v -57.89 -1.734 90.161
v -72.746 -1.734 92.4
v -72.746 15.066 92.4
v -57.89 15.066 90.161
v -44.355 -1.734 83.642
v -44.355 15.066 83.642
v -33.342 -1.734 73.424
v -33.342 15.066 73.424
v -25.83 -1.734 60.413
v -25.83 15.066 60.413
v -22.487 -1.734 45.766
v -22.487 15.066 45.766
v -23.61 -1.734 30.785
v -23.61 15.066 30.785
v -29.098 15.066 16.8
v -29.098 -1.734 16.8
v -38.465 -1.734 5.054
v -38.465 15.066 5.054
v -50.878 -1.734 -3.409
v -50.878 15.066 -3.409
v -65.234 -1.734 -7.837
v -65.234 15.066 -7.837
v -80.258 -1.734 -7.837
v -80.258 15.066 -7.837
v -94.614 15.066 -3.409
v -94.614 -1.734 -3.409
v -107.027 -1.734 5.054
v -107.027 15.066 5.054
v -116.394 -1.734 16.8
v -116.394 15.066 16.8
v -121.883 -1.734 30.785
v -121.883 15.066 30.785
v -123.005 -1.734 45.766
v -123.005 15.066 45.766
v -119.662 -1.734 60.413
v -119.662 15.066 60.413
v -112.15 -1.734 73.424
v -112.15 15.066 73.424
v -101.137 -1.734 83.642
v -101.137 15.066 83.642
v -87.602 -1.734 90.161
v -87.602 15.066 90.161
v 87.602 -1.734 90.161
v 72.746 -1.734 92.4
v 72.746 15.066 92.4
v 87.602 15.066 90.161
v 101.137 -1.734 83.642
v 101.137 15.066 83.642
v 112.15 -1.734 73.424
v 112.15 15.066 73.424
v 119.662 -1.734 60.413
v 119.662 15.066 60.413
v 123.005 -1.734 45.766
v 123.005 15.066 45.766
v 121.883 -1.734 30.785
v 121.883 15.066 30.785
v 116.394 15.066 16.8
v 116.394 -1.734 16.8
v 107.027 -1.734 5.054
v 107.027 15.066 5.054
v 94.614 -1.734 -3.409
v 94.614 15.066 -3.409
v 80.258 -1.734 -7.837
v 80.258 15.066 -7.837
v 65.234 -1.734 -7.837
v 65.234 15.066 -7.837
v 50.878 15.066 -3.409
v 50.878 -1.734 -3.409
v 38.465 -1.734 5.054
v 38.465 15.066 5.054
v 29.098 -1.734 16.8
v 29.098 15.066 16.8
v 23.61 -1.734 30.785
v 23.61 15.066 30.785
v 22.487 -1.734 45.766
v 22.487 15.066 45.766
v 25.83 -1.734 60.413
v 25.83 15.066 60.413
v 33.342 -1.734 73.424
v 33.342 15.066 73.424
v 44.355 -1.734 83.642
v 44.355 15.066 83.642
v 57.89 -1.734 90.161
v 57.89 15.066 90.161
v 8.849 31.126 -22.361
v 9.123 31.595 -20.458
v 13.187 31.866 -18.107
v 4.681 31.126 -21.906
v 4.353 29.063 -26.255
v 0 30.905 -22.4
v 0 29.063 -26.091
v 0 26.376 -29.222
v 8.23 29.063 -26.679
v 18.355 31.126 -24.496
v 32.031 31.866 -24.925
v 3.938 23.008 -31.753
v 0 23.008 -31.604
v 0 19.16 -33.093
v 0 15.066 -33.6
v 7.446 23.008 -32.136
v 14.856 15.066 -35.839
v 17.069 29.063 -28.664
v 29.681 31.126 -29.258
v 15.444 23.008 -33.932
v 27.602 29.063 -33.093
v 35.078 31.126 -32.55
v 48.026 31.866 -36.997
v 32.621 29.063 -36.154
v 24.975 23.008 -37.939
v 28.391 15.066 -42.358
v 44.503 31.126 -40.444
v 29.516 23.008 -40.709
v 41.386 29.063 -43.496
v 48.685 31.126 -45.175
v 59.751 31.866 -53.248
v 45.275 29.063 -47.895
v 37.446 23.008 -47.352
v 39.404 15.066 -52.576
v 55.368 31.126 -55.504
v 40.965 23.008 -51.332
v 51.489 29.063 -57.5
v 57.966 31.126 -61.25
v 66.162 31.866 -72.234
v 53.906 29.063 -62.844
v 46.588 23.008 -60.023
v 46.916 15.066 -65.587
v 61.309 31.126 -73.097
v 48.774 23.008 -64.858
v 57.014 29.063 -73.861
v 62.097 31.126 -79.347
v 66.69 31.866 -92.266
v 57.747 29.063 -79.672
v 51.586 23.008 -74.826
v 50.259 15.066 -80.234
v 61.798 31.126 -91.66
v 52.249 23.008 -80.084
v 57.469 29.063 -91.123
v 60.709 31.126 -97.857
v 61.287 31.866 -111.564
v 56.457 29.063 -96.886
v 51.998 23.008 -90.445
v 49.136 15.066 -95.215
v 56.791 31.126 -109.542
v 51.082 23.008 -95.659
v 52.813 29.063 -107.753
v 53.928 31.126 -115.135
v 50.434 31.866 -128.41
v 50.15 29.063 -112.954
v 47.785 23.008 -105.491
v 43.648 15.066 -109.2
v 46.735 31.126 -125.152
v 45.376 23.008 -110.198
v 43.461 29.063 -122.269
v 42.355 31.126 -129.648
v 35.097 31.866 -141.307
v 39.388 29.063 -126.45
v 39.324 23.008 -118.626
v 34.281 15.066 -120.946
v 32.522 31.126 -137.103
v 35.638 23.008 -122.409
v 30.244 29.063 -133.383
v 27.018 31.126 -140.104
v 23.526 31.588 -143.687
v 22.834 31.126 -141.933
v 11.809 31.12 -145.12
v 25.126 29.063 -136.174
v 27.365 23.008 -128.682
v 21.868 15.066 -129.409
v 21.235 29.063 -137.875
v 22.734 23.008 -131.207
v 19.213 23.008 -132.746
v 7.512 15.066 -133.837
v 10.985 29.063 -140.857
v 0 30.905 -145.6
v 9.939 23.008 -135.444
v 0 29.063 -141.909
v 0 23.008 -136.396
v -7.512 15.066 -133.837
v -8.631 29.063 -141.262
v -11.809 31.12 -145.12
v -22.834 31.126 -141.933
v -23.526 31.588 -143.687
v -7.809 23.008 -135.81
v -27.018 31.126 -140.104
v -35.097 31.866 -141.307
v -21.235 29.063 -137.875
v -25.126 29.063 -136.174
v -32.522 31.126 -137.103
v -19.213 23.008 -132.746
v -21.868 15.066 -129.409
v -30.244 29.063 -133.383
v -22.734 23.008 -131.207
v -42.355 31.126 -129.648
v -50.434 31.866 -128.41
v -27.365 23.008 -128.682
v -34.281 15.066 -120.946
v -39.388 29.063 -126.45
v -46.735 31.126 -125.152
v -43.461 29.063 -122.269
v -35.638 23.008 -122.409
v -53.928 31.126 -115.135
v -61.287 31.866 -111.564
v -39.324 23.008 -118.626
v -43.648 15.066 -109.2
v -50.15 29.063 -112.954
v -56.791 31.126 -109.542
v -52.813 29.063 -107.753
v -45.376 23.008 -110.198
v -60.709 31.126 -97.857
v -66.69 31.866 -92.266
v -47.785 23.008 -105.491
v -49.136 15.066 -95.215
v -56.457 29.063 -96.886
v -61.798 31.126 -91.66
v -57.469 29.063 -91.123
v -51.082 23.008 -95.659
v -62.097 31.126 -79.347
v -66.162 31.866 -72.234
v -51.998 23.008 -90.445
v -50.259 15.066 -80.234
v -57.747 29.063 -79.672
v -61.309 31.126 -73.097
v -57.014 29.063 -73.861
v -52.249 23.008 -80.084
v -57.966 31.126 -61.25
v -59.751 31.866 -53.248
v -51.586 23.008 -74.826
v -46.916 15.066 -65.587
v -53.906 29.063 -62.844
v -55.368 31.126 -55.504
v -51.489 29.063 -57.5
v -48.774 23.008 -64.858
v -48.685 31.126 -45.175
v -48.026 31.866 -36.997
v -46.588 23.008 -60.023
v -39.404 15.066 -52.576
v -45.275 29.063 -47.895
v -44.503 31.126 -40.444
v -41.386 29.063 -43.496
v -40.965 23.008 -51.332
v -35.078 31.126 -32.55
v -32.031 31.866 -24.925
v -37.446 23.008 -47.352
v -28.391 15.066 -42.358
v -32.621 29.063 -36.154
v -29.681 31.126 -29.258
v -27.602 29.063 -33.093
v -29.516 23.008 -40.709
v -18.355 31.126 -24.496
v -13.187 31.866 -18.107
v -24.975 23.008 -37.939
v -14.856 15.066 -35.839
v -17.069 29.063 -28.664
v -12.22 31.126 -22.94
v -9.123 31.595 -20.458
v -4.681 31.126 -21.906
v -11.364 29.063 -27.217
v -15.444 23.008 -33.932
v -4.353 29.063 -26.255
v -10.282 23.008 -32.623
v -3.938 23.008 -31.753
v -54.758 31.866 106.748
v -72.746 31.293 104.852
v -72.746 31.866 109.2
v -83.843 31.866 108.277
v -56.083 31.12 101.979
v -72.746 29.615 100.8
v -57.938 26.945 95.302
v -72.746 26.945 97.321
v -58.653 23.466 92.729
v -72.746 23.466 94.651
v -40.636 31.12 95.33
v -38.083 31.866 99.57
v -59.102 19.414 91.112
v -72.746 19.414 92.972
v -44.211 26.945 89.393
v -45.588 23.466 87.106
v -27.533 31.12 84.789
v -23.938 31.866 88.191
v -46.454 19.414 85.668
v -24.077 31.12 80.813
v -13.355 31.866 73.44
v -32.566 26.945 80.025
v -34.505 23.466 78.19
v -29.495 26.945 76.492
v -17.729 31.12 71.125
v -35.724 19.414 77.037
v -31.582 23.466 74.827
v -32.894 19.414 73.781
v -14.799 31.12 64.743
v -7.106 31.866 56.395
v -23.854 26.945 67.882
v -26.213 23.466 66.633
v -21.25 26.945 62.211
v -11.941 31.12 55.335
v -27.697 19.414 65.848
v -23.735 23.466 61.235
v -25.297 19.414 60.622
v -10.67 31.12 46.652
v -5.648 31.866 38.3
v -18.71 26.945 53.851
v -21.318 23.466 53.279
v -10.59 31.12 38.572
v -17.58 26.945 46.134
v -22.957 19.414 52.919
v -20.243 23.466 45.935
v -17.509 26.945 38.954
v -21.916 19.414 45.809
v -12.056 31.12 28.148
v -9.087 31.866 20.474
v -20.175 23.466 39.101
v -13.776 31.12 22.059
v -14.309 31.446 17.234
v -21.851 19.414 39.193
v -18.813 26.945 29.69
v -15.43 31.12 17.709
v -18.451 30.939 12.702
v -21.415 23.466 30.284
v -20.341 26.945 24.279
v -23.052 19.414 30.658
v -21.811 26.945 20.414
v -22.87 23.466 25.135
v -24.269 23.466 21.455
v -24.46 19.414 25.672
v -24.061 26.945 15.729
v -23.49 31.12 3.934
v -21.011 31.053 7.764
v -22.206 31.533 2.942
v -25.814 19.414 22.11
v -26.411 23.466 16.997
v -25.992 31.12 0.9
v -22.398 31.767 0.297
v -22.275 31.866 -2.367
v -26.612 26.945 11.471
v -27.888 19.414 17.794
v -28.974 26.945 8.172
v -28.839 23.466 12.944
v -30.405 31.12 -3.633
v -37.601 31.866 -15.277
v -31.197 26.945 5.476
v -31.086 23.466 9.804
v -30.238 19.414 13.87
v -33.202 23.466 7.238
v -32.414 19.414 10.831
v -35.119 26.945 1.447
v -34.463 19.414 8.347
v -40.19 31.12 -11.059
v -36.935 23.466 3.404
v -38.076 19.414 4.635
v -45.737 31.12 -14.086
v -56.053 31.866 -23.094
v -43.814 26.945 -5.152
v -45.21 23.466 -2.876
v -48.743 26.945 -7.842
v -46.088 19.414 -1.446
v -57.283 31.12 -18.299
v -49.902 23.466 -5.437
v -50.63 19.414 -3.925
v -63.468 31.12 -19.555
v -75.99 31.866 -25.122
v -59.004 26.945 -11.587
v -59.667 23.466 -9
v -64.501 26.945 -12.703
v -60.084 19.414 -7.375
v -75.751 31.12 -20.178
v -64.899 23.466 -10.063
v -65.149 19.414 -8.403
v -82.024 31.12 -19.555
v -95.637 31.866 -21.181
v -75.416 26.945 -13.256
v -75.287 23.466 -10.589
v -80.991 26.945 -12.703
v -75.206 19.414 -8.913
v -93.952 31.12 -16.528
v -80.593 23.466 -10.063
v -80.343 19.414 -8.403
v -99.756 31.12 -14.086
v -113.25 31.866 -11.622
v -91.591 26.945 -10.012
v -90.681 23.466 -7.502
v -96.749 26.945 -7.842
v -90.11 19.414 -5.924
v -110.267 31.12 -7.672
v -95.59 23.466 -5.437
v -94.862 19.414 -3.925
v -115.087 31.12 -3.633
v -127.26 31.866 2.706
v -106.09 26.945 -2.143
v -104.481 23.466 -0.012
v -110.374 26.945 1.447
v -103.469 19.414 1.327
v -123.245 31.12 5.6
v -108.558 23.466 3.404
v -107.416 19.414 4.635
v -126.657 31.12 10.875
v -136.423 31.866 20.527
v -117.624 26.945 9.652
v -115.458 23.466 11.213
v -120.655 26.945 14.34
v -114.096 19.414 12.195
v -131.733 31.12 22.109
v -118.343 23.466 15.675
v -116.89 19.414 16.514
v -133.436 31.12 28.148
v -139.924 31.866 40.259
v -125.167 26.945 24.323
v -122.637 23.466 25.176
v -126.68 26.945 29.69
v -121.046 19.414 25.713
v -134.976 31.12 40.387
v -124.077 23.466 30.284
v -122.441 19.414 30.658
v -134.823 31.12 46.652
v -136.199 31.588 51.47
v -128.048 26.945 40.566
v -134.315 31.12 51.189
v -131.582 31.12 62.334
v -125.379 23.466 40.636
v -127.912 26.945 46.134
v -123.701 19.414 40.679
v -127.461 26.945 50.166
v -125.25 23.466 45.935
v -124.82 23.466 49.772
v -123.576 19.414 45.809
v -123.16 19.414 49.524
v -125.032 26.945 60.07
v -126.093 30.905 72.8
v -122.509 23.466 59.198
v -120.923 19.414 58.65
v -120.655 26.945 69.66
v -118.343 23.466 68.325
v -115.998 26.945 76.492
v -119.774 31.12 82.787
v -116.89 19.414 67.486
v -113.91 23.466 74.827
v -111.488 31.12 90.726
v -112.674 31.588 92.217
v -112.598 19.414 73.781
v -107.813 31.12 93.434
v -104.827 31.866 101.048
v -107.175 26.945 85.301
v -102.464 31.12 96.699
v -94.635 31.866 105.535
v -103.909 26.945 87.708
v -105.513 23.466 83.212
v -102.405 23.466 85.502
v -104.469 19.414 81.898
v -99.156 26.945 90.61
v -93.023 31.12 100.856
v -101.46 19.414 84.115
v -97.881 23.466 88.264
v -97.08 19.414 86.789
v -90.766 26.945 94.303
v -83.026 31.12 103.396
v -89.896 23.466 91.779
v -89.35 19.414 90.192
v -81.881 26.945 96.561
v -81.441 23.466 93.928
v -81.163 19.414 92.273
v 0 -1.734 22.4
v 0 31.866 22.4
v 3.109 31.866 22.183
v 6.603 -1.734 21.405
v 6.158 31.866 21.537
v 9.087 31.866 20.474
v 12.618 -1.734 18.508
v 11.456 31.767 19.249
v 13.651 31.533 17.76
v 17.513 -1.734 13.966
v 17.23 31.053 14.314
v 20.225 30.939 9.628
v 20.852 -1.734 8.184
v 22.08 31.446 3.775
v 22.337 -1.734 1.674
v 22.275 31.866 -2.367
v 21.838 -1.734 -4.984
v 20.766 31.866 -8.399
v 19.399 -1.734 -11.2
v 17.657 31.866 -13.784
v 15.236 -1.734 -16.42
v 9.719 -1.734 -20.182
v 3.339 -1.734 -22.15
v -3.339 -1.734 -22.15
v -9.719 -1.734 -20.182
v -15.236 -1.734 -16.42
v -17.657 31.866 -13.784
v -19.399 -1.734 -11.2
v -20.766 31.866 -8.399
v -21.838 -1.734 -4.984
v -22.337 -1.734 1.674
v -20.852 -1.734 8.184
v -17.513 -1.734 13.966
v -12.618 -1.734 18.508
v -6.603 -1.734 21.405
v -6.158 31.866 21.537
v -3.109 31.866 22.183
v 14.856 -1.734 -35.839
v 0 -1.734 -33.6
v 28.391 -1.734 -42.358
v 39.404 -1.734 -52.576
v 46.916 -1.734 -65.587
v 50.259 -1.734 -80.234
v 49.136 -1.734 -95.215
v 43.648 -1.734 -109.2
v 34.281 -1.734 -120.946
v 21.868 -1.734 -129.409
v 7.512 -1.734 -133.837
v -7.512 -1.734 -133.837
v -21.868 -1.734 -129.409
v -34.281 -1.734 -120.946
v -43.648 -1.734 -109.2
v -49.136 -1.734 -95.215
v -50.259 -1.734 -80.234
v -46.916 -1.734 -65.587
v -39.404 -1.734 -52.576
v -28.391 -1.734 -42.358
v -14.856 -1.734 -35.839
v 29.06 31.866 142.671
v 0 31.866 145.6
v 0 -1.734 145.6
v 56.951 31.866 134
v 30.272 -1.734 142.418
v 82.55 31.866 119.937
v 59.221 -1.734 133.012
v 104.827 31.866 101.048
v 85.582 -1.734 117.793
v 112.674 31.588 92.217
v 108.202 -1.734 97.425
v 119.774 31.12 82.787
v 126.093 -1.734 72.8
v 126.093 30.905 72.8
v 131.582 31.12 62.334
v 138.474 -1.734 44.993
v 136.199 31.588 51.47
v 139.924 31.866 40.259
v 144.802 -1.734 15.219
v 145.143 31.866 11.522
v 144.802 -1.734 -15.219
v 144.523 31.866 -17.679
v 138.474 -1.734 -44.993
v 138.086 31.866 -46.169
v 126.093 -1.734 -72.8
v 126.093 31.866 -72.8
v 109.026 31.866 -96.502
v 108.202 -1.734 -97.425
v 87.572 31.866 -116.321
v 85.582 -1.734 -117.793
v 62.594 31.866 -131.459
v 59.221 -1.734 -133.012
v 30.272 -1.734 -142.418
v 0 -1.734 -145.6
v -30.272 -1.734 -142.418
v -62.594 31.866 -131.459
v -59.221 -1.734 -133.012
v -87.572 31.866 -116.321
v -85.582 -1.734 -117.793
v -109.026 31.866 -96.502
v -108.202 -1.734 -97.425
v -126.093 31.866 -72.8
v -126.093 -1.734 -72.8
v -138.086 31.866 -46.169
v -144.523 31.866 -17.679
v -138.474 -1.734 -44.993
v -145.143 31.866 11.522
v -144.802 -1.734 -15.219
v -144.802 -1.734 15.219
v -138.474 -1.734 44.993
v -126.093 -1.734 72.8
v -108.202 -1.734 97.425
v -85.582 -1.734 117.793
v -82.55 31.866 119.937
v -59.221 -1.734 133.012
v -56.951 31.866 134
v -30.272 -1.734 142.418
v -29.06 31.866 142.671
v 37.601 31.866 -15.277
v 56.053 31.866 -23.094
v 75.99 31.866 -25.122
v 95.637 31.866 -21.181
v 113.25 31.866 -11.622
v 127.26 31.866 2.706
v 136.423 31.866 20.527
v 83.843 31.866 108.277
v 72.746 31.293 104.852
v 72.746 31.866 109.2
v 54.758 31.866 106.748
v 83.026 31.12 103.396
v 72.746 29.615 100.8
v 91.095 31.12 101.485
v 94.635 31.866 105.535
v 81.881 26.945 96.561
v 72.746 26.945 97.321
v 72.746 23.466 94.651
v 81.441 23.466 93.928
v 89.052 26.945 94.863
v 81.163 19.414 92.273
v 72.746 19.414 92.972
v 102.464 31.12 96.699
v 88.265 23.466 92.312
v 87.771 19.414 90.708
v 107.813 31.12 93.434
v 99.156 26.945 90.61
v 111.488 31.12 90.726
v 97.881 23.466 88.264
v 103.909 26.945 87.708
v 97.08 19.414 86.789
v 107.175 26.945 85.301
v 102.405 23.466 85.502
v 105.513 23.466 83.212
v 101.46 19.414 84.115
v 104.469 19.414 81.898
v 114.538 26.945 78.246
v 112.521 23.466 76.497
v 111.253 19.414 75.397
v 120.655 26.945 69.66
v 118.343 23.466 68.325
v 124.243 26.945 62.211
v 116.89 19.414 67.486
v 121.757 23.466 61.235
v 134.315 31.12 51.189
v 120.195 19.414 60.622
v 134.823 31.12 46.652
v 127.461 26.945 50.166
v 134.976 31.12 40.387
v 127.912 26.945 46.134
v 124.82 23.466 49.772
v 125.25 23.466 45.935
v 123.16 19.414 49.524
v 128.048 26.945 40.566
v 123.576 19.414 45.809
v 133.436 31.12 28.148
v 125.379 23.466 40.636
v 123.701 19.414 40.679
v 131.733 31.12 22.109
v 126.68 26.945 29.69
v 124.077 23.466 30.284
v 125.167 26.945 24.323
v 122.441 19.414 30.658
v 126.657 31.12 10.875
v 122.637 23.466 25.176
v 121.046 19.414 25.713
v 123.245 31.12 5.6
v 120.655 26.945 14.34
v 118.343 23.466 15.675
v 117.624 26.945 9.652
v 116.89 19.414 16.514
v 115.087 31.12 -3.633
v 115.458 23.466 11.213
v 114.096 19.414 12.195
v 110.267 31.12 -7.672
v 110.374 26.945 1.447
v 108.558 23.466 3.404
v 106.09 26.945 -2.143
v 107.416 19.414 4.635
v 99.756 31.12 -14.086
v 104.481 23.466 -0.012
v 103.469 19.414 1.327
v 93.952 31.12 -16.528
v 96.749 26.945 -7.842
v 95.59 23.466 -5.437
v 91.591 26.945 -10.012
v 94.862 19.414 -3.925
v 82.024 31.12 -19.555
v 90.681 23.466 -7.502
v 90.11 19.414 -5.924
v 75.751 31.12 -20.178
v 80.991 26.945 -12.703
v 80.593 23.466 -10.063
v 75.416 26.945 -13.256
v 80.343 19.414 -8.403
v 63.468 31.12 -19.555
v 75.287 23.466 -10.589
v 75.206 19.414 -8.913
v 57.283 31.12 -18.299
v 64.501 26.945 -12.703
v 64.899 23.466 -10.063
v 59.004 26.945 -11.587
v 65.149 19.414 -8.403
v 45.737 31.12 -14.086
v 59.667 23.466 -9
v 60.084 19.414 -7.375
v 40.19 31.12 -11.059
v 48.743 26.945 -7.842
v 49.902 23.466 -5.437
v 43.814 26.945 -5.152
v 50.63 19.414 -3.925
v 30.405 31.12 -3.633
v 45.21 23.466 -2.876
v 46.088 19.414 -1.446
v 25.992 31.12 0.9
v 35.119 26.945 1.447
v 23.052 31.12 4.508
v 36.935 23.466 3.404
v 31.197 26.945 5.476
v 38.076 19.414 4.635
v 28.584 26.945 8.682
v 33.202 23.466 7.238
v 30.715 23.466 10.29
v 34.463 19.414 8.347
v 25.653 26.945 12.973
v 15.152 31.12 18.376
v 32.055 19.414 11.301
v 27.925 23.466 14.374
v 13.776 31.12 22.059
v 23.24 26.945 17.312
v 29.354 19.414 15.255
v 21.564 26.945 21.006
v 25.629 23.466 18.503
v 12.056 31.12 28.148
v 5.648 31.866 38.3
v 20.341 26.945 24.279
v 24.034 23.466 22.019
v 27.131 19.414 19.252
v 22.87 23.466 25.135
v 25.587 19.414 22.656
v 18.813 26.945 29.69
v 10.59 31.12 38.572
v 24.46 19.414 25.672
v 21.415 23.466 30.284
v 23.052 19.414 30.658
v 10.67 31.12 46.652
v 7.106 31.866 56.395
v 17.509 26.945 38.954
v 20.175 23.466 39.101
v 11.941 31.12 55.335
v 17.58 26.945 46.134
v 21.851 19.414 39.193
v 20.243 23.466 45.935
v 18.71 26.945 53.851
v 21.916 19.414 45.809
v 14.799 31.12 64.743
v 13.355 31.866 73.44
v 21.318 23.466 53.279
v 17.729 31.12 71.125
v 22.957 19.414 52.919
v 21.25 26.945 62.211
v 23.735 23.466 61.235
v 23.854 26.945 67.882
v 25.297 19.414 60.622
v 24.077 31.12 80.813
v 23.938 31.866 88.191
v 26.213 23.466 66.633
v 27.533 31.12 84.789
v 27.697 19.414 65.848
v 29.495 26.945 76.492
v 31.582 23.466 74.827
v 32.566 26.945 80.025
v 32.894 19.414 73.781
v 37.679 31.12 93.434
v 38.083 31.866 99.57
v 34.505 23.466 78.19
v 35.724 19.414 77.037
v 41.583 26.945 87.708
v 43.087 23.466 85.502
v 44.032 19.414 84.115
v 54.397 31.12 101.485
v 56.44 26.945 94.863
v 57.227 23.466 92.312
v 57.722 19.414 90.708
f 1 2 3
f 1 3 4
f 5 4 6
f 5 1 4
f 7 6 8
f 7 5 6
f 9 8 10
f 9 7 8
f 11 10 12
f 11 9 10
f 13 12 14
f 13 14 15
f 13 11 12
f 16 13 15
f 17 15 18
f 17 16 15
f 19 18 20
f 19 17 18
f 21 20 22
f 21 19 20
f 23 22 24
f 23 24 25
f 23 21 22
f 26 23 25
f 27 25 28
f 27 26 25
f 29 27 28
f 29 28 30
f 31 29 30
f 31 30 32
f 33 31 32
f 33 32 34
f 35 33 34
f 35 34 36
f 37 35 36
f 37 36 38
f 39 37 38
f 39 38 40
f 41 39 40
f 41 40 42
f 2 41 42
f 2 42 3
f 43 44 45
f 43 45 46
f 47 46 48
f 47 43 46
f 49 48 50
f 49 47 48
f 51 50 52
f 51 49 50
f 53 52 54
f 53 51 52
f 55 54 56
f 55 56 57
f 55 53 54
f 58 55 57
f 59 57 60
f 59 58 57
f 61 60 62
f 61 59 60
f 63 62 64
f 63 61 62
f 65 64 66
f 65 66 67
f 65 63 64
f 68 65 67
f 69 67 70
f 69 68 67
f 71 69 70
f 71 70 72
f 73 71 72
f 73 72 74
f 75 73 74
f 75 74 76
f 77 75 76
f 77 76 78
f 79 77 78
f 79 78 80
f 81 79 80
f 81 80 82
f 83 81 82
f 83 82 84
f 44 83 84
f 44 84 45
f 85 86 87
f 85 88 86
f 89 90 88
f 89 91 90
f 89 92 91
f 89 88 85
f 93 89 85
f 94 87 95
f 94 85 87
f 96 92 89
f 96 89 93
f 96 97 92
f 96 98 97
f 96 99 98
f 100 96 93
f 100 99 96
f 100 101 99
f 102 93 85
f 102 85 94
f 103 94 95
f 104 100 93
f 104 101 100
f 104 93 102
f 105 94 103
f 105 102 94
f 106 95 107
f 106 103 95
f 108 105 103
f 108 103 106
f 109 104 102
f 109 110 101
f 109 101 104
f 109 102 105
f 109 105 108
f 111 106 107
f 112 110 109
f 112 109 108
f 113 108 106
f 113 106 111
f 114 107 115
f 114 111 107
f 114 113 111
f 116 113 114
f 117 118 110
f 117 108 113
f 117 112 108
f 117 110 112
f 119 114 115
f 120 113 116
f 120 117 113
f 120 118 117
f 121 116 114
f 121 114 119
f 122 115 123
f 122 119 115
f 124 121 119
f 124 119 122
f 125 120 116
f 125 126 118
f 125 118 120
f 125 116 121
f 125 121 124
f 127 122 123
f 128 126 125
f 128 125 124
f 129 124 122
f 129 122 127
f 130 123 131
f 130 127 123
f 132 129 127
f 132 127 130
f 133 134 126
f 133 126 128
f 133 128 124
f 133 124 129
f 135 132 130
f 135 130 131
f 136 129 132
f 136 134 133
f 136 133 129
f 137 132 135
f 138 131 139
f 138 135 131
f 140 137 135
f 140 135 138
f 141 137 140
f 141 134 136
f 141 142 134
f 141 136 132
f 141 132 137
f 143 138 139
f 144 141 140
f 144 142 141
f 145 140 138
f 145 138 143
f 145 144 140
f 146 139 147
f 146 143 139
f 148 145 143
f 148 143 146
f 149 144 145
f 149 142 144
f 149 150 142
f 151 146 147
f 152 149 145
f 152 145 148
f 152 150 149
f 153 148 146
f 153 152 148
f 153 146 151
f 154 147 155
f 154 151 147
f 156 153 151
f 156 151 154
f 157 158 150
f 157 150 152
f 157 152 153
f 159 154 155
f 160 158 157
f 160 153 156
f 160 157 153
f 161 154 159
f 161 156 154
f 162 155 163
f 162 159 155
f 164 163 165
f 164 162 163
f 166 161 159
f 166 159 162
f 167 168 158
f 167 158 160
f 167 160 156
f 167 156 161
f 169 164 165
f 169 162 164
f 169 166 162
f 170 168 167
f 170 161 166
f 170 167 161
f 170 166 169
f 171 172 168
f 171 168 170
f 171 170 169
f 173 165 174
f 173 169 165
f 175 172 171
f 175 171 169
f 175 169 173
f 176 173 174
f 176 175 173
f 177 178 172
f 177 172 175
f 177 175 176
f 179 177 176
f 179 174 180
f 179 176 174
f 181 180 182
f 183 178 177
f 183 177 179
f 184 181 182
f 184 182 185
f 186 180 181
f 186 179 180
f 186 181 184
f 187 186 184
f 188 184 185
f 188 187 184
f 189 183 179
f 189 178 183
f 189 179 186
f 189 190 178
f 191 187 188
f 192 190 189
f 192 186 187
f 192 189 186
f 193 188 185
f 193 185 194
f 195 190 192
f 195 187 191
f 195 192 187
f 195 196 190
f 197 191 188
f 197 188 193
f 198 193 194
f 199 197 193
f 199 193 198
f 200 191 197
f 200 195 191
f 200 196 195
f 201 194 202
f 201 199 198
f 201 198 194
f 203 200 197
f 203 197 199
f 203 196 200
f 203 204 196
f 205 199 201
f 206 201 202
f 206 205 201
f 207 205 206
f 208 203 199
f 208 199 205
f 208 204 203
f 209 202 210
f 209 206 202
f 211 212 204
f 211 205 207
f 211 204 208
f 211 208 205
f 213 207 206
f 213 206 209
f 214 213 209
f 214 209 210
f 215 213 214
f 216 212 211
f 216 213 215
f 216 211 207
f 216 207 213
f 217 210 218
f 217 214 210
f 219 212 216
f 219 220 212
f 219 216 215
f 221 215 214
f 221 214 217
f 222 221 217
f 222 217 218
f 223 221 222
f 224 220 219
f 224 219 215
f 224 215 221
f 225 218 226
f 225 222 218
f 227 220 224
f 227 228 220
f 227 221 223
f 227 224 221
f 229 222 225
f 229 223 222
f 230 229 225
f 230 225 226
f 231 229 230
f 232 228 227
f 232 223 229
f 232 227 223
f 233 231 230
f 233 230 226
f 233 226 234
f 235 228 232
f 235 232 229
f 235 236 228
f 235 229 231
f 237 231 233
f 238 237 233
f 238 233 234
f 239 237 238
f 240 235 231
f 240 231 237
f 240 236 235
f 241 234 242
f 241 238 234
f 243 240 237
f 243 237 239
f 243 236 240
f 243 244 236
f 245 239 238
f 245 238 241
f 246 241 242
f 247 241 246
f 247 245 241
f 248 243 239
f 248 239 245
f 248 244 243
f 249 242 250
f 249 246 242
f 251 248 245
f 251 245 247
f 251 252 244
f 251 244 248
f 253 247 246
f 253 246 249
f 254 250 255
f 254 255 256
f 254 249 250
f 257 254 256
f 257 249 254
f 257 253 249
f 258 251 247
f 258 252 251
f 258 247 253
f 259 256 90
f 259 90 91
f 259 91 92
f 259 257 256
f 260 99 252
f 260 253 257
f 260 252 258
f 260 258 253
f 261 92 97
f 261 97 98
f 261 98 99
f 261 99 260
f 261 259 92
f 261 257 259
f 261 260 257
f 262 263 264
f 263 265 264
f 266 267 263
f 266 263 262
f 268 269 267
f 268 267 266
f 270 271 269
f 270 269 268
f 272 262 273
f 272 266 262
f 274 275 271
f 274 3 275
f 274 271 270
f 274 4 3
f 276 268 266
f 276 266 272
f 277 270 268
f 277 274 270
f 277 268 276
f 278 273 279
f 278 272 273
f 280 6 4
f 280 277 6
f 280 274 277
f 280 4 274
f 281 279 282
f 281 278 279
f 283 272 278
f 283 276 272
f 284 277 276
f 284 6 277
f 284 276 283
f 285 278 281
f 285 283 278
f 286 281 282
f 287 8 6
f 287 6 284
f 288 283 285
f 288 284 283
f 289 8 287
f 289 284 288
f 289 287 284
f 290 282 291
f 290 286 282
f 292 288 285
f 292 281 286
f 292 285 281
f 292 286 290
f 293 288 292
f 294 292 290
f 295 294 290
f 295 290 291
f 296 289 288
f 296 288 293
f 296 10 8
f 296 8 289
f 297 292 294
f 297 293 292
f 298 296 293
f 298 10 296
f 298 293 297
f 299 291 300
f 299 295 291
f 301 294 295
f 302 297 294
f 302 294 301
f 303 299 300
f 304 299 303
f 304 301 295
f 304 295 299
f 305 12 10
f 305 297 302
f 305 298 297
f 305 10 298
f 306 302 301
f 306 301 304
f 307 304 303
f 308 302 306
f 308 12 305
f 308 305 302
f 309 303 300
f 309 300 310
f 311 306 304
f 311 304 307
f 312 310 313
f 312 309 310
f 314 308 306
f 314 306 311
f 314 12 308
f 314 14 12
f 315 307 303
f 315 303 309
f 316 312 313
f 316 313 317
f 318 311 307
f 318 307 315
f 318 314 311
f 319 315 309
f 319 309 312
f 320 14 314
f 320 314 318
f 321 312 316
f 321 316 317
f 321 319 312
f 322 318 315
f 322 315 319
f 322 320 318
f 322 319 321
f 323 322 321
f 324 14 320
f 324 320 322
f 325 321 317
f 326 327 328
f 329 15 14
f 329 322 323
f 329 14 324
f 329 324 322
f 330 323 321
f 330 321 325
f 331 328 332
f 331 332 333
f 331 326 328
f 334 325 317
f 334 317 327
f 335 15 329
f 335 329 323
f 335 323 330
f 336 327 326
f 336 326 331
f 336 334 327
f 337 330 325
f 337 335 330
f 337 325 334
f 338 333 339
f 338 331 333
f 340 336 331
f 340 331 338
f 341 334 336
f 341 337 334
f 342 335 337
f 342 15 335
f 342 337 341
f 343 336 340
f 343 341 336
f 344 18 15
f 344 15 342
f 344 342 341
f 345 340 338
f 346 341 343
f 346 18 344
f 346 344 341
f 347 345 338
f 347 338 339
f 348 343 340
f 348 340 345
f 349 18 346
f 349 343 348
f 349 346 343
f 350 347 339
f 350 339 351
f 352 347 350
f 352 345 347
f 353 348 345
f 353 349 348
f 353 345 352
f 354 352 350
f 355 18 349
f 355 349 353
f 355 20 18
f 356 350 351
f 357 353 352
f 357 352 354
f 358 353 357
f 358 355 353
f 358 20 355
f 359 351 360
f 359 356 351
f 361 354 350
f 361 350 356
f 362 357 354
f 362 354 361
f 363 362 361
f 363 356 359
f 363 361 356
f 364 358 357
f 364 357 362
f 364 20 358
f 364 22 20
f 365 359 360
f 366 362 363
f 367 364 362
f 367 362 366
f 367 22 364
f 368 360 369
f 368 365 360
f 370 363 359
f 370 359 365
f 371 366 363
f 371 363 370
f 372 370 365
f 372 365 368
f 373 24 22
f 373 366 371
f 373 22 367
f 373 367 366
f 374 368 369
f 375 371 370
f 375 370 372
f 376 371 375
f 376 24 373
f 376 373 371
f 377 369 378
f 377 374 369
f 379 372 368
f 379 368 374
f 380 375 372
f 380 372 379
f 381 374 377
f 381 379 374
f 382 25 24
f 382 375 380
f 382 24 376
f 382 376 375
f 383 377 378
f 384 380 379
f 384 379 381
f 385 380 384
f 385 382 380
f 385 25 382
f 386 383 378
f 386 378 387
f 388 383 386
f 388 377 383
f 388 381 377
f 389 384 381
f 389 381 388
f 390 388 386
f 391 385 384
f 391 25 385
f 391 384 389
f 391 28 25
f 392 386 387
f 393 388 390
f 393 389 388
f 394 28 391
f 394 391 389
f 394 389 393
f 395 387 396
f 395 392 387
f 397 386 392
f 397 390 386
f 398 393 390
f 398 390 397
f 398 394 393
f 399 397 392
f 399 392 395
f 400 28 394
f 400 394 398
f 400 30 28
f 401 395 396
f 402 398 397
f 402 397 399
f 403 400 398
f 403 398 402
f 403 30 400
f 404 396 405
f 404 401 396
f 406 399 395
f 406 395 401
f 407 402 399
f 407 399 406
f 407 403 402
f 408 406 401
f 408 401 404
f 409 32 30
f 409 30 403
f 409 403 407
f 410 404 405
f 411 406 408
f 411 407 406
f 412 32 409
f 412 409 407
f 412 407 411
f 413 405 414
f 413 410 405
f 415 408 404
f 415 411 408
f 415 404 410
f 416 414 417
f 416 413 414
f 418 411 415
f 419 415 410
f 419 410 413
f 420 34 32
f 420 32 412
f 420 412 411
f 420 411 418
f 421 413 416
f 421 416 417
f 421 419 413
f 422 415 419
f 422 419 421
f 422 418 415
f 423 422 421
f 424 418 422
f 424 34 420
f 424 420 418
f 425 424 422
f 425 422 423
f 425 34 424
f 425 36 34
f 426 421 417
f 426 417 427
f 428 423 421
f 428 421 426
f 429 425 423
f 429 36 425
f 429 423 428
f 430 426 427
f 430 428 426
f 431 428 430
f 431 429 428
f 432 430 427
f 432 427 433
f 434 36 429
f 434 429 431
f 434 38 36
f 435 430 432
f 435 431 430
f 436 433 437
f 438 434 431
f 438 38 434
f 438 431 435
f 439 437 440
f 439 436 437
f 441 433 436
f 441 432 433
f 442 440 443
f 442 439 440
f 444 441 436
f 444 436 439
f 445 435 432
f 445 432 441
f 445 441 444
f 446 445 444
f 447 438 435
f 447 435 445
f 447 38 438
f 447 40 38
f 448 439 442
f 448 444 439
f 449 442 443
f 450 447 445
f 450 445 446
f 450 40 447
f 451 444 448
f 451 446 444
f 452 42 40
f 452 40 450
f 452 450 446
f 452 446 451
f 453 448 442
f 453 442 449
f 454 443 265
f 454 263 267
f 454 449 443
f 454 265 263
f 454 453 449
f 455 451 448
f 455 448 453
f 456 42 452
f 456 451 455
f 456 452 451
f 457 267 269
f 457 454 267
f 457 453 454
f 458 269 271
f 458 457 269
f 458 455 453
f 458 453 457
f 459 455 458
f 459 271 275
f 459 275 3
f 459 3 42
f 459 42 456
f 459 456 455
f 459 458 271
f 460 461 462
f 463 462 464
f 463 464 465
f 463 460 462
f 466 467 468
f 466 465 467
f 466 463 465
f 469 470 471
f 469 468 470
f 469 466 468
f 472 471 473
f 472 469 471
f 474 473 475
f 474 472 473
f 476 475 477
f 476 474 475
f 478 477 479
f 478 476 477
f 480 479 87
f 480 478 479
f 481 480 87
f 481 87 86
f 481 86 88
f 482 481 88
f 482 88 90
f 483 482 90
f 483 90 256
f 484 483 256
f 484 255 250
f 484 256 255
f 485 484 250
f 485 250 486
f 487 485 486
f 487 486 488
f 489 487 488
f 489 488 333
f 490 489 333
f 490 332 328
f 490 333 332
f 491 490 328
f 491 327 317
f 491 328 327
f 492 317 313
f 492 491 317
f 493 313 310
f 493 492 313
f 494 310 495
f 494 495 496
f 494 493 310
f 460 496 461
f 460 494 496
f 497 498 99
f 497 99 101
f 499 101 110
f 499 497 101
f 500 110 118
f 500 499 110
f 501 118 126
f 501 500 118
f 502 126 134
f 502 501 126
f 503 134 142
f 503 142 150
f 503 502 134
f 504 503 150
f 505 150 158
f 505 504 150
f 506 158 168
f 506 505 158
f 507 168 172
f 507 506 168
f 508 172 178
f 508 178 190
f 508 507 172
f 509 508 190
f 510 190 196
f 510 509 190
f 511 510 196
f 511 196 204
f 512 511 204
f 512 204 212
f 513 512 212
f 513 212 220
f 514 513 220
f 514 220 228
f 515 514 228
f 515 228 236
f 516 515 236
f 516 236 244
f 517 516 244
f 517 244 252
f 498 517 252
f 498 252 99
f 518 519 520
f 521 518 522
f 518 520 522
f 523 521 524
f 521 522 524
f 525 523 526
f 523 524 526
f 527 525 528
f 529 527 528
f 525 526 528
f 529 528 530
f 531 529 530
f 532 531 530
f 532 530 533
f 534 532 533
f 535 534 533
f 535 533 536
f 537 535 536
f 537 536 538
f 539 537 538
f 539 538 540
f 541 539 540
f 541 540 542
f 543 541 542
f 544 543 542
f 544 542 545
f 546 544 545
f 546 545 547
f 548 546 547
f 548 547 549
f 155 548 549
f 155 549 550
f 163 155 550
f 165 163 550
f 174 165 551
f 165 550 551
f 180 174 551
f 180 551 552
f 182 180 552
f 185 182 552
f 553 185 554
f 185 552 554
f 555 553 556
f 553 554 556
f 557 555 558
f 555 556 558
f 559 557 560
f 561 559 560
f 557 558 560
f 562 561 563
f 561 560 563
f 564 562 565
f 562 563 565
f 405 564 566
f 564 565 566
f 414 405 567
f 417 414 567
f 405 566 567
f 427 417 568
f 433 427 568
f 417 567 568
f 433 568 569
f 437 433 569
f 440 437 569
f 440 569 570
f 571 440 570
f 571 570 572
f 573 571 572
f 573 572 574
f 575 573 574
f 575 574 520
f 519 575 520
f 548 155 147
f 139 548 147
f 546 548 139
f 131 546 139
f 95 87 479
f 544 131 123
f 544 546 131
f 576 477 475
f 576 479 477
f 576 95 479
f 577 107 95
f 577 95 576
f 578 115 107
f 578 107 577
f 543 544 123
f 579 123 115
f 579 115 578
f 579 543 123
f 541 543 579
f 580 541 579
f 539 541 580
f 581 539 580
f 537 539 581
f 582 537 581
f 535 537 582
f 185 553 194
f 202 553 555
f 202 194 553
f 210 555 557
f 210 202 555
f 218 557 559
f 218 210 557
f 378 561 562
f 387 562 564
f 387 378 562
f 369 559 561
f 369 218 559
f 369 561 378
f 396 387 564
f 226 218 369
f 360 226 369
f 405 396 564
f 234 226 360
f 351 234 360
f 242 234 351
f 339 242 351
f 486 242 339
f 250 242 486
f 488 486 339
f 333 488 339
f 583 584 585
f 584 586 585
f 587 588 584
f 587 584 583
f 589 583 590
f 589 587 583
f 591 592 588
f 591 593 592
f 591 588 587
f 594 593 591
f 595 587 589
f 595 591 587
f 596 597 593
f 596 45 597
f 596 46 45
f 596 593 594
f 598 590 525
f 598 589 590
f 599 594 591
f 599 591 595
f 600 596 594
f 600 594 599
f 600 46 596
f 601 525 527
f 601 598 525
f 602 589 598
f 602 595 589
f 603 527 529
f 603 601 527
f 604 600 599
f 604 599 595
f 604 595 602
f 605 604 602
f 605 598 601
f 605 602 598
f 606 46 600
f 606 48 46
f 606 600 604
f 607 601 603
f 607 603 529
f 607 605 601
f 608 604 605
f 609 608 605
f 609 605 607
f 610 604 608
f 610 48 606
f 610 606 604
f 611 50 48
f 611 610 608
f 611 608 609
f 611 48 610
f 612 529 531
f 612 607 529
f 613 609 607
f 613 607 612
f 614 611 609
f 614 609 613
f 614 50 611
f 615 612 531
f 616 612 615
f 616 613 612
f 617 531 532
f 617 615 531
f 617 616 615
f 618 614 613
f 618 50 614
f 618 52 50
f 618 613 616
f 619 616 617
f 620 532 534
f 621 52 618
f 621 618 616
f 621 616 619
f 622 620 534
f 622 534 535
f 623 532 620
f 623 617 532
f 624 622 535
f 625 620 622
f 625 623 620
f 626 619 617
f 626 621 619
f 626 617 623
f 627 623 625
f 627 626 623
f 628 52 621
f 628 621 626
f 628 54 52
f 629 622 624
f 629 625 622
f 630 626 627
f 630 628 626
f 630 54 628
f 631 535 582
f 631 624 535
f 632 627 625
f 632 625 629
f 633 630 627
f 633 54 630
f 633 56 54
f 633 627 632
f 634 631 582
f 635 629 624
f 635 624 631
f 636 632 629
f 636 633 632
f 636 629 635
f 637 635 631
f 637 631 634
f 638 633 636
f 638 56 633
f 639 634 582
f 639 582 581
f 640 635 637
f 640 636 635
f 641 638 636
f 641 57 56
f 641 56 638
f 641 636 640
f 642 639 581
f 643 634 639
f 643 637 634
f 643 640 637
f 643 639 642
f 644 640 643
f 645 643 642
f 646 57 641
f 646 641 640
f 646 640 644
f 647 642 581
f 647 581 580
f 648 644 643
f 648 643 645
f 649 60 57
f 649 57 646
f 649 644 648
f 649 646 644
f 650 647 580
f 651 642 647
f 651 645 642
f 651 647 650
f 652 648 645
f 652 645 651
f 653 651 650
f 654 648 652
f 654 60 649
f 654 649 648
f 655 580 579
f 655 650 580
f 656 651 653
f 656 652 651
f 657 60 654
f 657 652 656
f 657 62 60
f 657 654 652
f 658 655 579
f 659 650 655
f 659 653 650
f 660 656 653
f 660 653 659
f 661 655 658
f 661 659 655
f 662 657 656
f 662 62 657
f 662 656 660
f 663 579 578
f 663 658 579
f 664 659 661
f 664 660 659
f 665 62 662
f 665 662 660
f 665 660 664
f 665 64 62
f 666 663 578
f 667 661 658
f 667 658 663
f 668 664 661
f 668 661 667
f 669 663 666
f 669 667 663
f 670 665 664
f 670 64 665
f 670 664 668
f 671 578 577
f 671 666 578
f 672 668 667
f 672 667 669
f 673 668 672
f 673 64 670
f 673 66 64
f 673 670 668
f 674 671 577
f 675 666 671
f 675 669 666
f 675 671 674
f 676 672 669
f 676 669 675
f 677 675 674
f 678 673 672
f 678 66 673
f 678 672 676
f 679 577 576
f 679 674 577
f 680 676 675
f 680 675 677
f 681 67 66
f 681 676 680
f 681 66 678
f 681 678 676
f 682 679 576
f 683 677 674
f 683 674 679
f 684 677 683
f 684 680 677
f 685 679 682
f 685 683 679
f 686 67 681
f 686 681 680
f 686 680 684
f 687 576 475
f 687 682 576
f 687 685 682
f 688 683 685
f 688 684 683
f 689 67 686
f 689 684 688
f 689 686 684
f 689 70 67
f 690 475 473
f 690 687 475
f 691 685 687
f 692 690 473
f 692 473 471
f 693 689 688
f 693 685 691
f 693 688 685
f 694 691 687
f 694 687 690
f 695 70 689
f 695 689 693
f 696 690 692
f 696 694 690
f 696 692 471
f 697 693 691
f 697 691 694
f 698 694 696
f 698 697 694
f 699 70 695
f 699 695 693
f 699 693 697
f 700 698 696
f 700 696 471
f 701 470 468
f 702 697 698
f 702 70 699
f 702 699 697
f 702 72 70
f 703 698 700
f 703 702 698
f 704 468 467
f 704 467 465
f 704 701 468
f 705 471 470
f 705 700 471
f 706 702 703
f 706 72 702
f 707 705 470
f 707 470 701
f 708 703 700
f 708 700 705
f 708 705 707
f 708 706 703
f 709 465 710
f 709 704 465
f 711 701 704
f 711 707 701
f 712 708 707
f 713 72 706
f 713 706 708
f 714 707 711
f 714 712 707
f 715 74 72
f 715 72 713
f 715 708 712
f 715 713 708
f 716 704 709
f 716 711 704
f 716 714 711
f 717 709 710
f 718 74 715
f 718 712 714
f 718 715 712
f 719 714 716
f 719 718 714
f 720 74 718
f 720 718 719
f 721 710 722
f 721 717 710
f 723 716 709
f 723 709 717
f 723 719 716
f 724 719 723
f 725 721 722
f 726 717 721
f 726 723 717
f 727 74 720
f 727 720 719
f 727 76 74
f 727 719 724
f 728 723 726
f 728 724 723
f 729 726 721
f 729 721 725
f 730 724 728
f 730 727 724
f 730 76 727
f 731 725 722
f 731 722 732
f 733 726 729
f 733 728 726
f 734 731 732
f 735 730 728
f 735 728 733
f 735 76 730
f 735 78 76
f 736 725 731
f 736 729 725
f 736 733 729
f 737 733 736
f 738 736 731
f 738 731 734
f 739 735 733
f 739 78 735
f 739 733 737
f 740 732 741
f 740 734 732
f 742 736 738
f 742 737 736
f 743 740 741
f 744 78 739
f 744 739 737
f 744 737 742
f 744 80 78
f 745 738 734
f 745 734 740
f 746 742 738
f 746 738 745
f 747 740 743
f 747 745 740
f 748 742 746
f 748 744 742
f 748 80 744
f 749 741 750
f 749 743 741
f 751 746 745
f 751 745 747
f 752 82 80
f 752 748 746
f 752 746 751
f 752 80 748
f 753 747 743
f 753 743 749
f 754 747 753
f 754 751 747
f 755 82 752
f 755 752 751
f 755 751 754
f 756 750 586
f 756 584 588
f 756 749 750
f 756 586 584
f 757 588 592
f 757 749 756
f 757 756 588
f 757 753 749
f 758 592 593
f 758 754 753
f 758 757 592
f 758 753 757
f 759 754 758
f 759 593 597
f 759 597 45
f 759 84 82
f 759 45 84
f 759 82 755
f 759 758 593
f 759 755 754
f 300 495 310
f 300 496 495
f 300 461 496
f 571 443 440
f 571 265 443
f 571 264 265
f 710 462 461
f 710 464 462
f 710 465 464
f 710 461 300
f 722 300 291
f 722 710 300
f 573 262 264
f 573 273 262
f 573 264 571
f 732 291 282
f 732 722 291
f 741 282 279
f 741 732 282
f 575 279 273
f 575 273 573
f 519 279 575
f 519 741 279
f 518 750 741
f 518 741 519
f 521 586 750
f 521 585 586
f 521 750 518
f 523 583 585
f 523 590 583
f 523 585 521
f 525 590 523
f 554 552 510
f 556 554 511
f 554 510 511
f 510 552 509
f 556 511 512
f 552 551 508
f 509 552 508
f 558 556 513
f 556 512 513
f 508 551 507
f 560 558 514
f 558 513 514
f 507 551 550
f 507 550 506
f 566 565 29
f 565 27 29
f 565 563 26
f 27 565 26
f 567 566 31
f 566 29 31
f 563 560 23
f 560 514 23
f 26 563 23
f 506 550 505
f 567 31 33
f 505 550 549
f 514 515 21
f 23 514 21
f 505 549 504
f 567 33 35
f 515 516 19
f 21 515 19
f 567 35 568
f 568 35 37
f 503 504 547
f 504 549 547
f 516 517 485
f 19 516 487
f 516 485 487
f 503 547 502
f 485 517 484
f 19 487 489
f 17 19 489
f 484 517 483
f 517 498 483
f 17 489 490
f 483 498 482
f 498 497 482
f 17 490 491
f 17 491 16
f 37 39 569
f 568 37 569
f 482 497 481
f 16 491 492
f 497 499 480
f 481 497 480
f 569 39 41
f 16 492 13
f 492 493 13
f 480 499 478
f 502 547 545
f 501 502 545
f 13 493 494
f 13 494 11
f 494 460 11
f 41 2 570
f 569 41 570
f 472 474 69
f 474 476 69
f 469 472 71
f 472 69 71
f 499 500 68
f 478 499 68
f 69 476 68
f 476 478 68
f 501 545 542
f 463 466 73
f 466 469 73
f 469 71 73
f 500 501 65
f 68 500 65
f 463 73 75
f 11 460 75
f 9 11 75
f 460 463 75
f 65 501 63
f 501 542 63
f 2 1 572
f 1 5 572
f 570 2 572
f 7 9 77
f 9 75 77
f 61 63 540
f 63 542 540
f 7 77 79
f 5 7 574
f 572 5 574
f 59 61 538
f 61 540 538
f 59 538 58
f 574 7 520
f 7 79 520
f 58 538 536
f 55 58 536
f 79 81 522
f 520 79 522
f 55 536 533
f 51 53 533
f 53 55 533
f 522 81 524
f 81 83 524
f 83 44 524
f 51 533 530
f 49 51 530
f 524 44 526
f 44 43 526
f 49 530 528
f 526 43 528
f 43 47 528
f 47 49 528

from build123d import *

# Parameters (mm, degrees)
SKETCH2_R           = 130
SKETCH2_R_2         = 45
SKETCH2_R_3         = 20
BOSS_EXTRUDE2_DEPTH = 30
FILLET1_R           = 15
SCALE1_SCALE        = 1.12


with BuildPart() as part:
    # Sketch2 → Boss-Extrude2 (new body)
    with BuildSketch(Plane(origin=(0, 0, 0), x_dir=(1, 0, 0), z_dir=(0, 1, 0))):
        with Locations(Location((0, 0, 0), (0, 0, 270))):
            Circle(SKETCH2_R)
        with Locations(Location((0, 75, 0), (0, 0, 270))):
            Circle(SKETCH2_R_2, mode=Mode.SUBTRACT)
        with Locations(Location((64.951905284, -37.5, 0), (0, 0, 270))):
            Circle(SKETCH2_R_2, mode=Mode.SUBTRACT)
        with Locations(Location((-64.951905284, -37.5, 0), (0, 0, 270))):
            Circle(SKETCH2_R_2, mode=Mode.SUBTRACT)
        with Locations(Location((0, 0, 0), (0, 0, 270))):
            Circle(SKETCH2_R_3, mode=Mode.SUBTRACT)
    extrude(amount=BOSS_EXTRUDE2_DEPTH)

    # Fillet1
    # the kernel refuses this fillet: 15 mm, written as the material it takes off along each edge
    with BuildSketch(Plane(origin=(64.951905284, 30, 37.5), x_dir=(0, 0, 1), z_dir=(-1, 0, 0))) as fillet1_piece_1:
        with BuildLine():
            CenterArc((45 + FILLET1_R, -FILLET1_R), FILLET1_R, 90, 90)
            Line((45 + FILLET1_R, 0), (45, 0))
            Line((45, 0), (45, -FILLET1_R))
        make_face()
    revolve(axis=Axis((64.951905284, 30, 37.5), (0, 1, 0)), mode=Mode.SUBTRACT)
    with BuildSketch(Plane(origin=(-64.951905284, 30, 37.5), x_dir=(0, 0, 1), z_dir=(-1, 0, 0))) as fillet1_piece_2:
        with BuildLine():
            CenterArc((45 + FILLET1_R, -FILLET1_R), FILLET1_R, 90, 90)
            Line((45 + FILLET1_R, 0), (45, 0))
            Line((45, 0), (45, -FILLET1_R))
        make_face()
    revolve(axis=Axis((-64.951905284, 30, 37.5), (0, 1, 0)), mode=Mode.SUBTRACT)
    with BuildSketch(Plane(origin=(0, 30, -75), x_dir=(0, 0, 1), z_dir=(-1, 0, 0))) as fillet1_piece_3:
        with BuildLine():
            CenterArc((45 + FILLET1_R, -FILLET1_R), FILLET1_R, 90, 90)
            Line((45 + FILLET1_R, 0), (45, 0))
            Line((45, 0), (45, -FILLET1_R))
        make_face()
    revolve(axis=Axis((0, 30, -75), (0, 1, 0)), mode=Mode.SUBTRACT)


with BuildPart() as part_1:
    # Scale1: scaled about (7.8e-08, 14.452007368, -8e-08)
    add(part.part.scale(SCALE1_SCALE).moved(Location((-9e-09, -1.734240884, 1e-08))))


solid = part_1.part
